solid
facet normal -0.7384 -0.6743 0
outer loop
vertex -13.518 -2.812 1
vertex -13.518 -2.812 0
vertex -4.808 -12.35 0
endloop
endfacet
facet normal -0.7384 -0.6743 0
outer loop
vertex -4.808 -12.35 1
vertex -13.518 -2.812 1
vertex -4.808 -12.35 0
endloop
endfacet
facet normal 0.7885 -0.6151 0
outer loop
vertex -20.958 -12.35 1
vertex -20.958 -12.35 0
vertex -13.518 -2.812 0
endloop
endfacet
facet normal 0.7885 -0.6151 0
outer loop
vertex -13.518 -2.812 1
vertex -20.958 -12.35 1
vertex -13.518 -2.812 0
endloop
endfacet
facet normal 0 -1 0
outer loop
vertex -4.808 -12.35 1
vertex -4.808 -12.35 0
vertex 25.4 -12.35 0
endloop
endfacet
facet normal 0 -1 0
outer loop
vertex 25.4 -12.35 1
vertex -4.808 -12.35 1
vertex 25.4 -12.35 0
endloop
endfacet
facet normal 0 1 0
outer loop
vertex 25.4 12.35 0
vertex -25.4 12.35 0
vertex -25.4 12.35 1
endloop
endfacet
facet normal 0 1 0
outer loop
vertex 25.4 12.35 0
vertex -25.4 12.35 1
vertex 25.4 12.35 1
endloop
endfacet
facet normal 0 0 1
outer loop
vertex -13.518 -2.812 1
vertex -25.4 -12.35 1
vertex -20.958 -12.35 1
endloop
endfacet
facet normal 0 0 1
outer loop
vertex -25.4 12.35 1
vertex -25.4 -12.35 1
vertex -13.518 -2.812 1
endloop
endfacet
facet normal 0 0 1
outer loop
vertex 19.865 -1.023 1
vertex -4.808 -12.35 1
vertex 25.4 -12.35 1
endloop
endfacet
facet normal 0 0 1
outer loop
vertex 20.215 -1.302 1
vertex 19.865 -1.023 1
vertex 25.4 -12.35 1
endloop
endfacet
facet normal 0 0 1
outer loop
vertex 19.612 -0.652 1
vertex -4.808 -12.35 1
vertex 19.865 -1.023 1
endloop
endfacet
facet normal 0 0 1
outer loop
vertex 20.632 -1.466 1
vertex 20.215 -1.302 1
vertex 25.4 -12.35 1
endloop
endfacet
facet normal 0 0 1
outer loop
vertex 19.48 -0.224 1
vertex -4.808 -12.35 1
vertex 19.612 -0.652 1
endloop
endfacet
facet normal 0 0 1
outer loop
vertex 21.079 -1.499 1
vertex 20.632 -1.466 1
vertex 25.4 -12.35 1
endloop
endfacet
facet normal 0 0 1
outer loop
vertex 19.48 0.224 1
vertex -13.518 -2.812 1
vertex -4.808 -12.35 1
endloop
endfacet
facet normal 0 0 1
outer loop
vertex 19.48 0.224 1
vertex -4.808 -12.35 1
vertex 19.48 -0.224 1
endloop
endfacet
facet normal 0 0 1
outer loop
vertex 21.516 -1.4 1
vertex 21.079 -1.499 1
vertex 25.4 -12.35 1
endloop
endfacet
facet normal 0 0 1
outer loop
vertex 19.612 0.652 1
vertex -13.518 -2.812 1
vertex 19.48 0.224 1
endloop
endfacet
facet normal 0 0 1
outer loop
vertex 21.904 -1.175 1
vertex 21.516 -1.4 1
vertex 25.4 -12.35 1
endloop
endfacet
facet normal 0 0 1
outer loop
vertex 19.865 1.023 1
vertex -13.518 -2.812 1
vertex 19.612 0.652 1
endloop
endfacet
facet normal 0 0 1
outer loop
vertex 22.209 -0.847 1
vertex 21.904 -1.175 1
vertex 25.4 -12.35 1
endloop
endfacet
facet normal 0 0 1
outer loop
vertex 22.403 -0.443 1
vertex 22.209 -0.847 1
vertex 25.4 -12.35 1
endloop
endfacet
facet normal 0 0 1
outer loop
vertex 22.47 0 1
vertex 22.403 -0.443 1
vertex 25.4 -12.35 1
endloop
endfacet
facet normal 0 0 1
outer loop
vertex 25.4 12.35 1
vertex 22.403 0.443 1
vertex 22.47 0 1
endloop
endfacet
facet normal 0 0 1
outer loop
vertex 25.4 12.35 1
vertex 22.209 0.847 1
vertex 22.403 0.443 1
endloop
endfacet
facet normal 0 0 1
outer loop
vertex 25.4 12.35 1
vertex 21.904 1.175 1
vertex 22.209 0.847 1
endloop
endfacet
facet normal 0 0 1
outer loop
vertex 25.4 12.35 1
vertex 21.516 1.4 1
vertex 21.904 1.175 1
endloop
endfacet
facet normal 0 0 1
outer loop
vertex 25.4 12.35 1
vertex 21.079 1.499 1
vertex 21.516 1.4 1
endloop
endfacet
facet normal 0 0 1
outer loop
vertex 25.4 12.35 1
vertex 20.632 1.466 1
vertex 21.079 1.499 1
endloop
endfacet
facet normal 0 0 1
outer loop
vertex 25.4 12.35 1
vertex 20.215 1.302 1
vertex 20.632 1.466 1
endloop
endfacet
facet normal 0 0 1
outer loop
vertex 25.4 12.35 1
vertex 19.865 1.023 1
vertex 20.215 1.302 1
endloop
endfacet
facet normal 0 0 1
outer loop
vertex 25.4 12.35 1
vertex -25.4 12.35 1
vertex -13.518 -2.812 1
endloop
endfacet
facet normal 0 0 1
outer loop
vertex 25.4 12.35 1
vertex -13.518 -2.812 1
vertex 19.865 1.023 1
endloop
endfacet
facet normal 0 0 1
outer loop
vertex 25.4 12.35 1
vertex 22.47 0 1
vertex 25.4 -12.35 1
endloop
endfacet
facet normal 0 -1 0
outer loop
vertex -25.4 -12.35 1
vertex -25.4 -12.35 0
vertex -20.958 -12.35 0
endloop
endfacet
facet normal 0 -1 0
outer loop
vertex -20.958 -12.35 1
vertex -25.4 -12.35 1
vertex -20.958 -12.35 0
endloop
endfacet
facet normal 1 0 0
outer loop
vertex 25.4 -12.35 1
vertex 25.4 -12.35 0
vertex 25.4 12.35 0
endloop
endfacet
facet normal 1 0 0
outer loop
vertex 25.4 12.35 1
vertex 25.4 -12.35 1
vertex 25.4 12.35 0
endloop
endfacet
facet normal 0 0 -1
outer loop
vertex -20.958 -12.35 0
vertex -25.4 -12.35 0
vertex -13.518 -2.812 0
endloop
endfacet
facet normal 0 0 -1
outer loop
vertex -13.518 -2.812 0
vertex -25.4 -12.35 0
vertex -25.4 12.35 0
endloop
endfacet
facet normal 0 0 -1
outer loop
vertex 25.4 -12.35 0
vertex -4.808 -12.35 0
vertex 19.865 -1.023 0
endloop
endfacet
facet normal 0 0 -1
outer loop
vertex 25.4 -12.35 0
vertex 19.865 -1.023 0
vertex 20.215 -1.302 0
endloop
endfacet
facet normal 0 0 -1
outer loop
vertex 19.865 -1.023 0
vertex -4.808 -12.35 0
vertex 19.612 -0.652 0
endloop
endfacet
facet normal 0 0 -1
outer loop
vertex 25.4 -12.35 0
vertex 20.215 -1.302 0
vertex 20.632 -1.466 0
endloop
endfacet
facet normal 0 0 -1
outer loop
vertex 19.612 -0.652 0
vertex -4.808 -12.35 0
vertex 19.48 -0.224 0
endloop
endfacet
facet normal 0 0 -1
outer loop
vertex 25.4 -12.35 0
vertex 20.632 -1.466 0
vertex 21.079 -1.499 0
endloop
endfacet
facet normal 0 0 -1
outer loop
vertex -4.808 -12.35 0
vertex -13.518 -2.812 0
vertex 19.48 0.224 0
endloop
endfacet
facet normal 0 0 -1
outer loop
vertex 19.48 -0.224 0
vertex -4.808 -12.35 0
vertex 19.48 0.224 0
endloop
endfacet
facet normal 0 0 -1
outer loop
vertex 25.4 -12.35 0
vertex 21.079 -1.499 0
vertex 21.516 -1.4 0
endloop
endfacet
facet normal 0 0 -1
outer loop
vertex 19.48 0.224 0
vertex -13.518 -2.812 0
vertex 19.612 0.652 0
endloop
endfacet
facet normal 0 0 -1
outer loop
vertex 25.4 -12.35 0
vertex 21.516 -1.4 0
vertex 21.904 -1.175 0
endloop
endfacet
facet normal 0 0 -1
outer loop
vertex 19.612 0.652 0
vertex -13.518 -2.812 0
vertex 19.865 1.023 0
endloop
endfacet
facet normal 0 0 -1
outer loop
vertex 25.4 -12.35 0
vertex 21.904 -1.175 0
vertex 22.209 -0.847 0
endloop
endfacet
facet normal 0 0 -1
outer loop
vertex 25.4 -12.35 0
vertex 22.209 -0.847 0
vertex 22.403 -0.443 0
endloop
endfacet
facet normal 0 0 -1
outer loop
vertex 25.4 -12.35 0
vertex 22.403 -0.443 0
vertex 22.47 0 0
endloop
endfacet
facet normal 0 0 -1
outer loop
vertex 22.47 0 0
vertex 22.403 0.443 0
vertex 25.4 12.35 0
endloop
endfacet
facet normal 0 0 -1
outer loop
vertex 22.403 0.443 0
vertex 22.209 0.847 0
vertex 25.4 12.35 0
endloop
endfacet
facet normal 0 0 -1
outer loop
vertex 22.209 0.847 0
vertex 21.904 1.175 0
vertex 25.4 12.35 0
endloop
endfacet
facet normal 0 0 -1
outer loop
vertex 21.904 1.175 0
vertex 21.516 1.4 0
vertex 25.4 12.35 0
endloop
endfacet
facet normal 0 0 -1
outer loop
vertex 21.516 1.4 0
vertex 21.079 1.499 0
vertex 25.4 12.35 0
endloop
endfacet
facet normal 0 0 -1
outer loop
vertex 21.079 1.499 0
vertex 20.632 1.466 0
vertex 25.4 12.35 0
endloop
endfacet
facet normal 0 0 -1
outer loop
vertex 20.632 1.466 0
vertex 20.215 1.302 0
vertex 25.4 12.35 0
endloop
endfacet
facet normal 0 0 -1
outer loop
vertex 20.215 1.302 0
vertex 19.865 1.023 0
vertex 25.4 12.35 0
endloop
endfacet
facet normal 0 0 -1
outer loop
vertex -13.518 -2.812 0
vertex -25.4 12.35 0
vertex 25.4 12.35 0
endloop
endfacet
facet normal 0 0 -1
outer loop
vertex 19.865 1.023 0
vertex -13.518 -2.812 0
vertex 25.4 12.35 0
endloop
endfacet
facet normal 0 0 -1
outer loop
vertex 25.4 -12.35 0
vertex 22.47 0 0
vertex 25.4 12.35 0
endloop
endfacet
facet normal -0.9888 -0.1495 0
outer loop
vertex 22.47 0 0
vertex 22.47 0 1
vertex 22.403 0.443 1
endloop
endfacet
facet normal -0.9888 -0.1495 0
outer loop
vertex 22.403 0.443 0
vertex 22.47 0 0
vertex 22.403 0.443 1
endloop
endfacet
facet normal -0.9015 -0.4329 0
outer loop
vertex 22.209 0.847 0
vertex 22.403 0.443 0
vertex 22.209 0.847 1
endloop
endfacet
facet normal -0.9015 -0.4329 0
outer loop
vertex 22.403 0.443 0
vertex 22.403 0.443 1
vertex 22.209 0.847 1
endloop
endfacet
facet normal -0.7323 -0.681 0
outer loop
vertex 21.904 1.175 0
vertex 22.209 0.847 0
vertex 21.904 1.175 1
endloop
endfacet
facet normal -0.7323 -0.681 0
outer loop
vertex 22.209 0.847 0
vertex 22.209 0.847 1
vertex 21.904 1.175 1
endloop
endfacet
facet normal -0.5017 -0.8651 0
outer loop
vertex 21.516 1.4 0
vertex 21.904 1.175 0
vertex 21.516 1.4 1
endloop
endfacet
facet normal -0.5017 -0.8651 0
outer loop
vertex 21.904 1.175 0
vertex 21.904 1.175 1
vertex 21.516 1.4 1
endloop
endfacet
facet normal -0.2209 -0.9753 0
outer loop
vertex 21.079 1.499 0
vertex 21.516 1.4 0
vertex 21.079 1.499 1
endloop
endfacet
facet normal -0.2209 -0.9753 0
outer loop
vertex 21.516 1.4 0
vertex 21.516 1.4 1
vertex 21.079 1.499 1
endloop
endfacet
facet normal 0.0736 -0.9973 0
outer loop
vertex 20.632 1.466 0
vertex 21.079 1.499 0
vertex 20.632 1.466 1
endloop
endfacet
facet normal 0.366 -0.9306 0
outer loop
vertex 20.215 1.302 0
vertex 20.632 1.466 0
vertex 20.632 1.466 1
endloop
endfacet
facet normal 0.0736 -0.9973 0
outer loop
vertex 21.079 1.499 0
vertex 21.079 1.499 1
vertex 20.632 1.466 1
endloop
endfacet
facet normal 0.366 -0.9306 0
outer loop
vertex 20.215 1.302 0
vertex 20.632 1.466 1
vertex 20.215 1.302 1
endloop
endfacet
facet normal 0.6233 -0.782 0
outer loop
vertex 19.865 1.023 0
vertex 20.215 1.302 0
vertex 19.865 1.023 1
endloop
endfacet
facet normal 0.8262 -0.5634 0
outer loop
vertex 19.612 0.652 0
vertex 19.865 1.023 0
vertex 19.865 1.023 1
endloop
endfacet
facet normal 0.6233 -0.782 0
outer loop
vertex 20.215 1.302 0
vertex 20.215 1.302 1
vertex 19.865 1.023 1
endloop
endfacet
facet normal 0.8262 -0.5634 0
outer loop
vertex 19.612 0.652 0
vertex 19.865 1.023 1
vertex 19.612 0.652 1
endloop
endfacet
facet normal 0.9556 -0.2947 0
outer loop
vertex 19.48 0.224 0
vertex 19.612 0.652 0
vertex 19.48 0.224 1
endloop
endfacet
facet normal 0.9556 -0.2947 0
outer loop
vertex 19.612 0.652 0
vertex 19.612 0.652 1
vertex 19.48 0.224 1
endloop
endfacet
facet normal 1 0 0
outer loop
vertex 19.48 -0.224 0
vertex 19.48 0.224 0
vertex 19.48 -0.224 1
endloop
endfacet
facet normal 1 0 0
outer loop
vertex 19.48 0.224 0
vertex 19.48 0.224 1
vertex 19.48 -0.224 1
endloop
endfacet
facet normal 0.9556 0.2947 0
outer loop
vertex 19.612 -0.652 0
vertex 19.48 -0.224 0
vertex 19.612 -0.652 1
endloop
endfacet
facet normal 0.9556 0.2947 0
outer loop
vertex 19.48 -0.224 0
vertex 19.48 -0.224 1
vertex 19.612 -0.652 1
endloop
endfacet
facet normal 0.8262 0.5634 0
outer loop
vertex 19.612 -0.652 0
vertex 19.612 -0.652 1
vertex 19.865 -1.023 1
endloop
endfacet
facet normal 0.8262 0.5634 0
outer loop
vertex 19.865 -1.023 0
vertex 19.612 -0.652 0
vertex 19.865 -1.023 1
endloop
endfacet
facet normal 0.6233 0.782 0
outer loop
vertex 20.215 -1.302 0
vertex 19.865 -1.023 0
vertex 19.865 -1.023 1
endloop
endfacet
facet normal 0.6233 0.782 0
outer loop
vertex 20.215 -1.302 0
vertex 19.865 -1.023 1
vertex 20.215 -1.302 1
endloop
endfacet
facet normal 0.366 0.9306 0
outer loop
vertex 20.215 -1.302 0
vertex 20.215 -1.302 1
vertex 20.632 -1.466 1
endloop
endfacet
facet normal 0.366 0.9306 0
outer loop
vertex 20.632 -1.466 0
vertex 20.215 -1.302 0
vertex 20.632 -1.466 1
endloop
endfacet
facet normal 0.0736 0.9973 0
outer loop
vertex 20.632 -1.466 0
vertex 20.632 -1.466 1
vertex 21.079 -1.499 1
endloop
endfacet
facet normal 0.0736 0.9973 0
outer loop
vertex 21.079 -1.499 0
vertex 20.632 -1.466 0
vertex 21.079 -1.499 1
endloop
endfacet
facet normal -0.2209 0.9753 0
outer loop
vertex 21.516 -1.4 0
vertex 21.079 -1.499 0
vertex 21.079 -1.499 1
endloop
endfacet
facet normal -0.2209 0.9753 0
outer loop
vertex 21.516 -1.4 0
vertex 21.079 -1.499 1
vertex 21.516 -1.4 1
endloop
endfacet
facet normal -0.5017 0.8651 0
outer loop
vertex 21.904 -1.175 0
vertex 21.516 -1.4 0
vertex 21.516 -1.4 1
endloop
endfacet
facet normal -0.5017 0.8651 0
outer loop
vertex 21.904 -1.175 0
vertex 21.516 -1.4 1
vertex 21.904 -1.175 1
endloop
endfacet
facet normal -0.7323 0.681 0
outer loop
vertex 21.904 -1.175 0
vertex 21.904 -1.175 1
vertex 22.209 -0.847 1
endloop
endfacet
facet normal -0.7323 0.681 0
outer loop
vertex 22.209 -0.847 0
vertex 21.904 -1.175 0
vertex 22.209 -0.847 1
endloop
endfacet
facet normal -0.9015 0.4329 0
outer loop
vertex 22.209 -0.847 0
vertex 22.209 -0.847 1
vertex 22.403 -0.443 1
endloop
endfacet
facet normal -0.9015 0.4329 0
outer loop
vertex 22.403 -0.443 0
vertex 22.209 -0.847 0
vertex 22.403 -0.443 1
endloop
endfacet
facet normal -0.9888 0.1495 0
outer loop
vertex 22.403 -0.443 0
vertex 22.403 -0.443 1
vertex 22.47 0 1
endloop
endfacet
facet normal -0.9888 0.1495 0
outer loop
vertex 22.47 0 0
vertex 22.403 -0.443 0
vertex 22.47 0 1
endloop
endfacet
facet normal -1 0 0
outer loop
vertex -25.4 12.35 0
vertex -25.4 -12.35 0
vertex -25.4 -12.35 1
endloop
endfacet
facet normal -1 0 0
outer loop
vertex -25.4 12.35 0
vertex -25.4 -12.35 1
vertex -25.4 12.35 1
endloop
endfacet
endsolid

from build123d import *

# Parameters (mm, degrees)
F0_W     = 50.8
F0_H     = 24.7
F1_DEPTH = 1
F2_R     = 1.503447
F3_DEPTH = 25
F5_DEPTH = 25


with BuildPart() as f1:
    # F0 (on Top) → F1 (new body)
    with BuildSketch(Plane.XY):
        Rectangle(F0_W, F0_H)
    extrude(amount=F1_DEPTH)

    # F2 (on face) → F3 (cut)
    with BuildSketch(Plane.XY.offset(1)):
        with Locations((20.966841, 0)):
            Circle(F2_R)
    extrude(amount=-F3_DEPTH, mode=Mode.SUBTRACT)

    # F4 (on face) → F5 (cut)
    with BuildSketch(Plane(origin=(0, 0, 0), x_dir=(1, 0, 0), z_dir=(0, 0, -1))):
        Polygon((-13.518144, 21.329358), (-20.957662, 12.35), (-13.518144, 2.8125), (-4.808467, 12.35), align=None)
    extrude(amount=-F5_DEPTH, mode=Mode.SUBTRACT)


solid = f1.part
